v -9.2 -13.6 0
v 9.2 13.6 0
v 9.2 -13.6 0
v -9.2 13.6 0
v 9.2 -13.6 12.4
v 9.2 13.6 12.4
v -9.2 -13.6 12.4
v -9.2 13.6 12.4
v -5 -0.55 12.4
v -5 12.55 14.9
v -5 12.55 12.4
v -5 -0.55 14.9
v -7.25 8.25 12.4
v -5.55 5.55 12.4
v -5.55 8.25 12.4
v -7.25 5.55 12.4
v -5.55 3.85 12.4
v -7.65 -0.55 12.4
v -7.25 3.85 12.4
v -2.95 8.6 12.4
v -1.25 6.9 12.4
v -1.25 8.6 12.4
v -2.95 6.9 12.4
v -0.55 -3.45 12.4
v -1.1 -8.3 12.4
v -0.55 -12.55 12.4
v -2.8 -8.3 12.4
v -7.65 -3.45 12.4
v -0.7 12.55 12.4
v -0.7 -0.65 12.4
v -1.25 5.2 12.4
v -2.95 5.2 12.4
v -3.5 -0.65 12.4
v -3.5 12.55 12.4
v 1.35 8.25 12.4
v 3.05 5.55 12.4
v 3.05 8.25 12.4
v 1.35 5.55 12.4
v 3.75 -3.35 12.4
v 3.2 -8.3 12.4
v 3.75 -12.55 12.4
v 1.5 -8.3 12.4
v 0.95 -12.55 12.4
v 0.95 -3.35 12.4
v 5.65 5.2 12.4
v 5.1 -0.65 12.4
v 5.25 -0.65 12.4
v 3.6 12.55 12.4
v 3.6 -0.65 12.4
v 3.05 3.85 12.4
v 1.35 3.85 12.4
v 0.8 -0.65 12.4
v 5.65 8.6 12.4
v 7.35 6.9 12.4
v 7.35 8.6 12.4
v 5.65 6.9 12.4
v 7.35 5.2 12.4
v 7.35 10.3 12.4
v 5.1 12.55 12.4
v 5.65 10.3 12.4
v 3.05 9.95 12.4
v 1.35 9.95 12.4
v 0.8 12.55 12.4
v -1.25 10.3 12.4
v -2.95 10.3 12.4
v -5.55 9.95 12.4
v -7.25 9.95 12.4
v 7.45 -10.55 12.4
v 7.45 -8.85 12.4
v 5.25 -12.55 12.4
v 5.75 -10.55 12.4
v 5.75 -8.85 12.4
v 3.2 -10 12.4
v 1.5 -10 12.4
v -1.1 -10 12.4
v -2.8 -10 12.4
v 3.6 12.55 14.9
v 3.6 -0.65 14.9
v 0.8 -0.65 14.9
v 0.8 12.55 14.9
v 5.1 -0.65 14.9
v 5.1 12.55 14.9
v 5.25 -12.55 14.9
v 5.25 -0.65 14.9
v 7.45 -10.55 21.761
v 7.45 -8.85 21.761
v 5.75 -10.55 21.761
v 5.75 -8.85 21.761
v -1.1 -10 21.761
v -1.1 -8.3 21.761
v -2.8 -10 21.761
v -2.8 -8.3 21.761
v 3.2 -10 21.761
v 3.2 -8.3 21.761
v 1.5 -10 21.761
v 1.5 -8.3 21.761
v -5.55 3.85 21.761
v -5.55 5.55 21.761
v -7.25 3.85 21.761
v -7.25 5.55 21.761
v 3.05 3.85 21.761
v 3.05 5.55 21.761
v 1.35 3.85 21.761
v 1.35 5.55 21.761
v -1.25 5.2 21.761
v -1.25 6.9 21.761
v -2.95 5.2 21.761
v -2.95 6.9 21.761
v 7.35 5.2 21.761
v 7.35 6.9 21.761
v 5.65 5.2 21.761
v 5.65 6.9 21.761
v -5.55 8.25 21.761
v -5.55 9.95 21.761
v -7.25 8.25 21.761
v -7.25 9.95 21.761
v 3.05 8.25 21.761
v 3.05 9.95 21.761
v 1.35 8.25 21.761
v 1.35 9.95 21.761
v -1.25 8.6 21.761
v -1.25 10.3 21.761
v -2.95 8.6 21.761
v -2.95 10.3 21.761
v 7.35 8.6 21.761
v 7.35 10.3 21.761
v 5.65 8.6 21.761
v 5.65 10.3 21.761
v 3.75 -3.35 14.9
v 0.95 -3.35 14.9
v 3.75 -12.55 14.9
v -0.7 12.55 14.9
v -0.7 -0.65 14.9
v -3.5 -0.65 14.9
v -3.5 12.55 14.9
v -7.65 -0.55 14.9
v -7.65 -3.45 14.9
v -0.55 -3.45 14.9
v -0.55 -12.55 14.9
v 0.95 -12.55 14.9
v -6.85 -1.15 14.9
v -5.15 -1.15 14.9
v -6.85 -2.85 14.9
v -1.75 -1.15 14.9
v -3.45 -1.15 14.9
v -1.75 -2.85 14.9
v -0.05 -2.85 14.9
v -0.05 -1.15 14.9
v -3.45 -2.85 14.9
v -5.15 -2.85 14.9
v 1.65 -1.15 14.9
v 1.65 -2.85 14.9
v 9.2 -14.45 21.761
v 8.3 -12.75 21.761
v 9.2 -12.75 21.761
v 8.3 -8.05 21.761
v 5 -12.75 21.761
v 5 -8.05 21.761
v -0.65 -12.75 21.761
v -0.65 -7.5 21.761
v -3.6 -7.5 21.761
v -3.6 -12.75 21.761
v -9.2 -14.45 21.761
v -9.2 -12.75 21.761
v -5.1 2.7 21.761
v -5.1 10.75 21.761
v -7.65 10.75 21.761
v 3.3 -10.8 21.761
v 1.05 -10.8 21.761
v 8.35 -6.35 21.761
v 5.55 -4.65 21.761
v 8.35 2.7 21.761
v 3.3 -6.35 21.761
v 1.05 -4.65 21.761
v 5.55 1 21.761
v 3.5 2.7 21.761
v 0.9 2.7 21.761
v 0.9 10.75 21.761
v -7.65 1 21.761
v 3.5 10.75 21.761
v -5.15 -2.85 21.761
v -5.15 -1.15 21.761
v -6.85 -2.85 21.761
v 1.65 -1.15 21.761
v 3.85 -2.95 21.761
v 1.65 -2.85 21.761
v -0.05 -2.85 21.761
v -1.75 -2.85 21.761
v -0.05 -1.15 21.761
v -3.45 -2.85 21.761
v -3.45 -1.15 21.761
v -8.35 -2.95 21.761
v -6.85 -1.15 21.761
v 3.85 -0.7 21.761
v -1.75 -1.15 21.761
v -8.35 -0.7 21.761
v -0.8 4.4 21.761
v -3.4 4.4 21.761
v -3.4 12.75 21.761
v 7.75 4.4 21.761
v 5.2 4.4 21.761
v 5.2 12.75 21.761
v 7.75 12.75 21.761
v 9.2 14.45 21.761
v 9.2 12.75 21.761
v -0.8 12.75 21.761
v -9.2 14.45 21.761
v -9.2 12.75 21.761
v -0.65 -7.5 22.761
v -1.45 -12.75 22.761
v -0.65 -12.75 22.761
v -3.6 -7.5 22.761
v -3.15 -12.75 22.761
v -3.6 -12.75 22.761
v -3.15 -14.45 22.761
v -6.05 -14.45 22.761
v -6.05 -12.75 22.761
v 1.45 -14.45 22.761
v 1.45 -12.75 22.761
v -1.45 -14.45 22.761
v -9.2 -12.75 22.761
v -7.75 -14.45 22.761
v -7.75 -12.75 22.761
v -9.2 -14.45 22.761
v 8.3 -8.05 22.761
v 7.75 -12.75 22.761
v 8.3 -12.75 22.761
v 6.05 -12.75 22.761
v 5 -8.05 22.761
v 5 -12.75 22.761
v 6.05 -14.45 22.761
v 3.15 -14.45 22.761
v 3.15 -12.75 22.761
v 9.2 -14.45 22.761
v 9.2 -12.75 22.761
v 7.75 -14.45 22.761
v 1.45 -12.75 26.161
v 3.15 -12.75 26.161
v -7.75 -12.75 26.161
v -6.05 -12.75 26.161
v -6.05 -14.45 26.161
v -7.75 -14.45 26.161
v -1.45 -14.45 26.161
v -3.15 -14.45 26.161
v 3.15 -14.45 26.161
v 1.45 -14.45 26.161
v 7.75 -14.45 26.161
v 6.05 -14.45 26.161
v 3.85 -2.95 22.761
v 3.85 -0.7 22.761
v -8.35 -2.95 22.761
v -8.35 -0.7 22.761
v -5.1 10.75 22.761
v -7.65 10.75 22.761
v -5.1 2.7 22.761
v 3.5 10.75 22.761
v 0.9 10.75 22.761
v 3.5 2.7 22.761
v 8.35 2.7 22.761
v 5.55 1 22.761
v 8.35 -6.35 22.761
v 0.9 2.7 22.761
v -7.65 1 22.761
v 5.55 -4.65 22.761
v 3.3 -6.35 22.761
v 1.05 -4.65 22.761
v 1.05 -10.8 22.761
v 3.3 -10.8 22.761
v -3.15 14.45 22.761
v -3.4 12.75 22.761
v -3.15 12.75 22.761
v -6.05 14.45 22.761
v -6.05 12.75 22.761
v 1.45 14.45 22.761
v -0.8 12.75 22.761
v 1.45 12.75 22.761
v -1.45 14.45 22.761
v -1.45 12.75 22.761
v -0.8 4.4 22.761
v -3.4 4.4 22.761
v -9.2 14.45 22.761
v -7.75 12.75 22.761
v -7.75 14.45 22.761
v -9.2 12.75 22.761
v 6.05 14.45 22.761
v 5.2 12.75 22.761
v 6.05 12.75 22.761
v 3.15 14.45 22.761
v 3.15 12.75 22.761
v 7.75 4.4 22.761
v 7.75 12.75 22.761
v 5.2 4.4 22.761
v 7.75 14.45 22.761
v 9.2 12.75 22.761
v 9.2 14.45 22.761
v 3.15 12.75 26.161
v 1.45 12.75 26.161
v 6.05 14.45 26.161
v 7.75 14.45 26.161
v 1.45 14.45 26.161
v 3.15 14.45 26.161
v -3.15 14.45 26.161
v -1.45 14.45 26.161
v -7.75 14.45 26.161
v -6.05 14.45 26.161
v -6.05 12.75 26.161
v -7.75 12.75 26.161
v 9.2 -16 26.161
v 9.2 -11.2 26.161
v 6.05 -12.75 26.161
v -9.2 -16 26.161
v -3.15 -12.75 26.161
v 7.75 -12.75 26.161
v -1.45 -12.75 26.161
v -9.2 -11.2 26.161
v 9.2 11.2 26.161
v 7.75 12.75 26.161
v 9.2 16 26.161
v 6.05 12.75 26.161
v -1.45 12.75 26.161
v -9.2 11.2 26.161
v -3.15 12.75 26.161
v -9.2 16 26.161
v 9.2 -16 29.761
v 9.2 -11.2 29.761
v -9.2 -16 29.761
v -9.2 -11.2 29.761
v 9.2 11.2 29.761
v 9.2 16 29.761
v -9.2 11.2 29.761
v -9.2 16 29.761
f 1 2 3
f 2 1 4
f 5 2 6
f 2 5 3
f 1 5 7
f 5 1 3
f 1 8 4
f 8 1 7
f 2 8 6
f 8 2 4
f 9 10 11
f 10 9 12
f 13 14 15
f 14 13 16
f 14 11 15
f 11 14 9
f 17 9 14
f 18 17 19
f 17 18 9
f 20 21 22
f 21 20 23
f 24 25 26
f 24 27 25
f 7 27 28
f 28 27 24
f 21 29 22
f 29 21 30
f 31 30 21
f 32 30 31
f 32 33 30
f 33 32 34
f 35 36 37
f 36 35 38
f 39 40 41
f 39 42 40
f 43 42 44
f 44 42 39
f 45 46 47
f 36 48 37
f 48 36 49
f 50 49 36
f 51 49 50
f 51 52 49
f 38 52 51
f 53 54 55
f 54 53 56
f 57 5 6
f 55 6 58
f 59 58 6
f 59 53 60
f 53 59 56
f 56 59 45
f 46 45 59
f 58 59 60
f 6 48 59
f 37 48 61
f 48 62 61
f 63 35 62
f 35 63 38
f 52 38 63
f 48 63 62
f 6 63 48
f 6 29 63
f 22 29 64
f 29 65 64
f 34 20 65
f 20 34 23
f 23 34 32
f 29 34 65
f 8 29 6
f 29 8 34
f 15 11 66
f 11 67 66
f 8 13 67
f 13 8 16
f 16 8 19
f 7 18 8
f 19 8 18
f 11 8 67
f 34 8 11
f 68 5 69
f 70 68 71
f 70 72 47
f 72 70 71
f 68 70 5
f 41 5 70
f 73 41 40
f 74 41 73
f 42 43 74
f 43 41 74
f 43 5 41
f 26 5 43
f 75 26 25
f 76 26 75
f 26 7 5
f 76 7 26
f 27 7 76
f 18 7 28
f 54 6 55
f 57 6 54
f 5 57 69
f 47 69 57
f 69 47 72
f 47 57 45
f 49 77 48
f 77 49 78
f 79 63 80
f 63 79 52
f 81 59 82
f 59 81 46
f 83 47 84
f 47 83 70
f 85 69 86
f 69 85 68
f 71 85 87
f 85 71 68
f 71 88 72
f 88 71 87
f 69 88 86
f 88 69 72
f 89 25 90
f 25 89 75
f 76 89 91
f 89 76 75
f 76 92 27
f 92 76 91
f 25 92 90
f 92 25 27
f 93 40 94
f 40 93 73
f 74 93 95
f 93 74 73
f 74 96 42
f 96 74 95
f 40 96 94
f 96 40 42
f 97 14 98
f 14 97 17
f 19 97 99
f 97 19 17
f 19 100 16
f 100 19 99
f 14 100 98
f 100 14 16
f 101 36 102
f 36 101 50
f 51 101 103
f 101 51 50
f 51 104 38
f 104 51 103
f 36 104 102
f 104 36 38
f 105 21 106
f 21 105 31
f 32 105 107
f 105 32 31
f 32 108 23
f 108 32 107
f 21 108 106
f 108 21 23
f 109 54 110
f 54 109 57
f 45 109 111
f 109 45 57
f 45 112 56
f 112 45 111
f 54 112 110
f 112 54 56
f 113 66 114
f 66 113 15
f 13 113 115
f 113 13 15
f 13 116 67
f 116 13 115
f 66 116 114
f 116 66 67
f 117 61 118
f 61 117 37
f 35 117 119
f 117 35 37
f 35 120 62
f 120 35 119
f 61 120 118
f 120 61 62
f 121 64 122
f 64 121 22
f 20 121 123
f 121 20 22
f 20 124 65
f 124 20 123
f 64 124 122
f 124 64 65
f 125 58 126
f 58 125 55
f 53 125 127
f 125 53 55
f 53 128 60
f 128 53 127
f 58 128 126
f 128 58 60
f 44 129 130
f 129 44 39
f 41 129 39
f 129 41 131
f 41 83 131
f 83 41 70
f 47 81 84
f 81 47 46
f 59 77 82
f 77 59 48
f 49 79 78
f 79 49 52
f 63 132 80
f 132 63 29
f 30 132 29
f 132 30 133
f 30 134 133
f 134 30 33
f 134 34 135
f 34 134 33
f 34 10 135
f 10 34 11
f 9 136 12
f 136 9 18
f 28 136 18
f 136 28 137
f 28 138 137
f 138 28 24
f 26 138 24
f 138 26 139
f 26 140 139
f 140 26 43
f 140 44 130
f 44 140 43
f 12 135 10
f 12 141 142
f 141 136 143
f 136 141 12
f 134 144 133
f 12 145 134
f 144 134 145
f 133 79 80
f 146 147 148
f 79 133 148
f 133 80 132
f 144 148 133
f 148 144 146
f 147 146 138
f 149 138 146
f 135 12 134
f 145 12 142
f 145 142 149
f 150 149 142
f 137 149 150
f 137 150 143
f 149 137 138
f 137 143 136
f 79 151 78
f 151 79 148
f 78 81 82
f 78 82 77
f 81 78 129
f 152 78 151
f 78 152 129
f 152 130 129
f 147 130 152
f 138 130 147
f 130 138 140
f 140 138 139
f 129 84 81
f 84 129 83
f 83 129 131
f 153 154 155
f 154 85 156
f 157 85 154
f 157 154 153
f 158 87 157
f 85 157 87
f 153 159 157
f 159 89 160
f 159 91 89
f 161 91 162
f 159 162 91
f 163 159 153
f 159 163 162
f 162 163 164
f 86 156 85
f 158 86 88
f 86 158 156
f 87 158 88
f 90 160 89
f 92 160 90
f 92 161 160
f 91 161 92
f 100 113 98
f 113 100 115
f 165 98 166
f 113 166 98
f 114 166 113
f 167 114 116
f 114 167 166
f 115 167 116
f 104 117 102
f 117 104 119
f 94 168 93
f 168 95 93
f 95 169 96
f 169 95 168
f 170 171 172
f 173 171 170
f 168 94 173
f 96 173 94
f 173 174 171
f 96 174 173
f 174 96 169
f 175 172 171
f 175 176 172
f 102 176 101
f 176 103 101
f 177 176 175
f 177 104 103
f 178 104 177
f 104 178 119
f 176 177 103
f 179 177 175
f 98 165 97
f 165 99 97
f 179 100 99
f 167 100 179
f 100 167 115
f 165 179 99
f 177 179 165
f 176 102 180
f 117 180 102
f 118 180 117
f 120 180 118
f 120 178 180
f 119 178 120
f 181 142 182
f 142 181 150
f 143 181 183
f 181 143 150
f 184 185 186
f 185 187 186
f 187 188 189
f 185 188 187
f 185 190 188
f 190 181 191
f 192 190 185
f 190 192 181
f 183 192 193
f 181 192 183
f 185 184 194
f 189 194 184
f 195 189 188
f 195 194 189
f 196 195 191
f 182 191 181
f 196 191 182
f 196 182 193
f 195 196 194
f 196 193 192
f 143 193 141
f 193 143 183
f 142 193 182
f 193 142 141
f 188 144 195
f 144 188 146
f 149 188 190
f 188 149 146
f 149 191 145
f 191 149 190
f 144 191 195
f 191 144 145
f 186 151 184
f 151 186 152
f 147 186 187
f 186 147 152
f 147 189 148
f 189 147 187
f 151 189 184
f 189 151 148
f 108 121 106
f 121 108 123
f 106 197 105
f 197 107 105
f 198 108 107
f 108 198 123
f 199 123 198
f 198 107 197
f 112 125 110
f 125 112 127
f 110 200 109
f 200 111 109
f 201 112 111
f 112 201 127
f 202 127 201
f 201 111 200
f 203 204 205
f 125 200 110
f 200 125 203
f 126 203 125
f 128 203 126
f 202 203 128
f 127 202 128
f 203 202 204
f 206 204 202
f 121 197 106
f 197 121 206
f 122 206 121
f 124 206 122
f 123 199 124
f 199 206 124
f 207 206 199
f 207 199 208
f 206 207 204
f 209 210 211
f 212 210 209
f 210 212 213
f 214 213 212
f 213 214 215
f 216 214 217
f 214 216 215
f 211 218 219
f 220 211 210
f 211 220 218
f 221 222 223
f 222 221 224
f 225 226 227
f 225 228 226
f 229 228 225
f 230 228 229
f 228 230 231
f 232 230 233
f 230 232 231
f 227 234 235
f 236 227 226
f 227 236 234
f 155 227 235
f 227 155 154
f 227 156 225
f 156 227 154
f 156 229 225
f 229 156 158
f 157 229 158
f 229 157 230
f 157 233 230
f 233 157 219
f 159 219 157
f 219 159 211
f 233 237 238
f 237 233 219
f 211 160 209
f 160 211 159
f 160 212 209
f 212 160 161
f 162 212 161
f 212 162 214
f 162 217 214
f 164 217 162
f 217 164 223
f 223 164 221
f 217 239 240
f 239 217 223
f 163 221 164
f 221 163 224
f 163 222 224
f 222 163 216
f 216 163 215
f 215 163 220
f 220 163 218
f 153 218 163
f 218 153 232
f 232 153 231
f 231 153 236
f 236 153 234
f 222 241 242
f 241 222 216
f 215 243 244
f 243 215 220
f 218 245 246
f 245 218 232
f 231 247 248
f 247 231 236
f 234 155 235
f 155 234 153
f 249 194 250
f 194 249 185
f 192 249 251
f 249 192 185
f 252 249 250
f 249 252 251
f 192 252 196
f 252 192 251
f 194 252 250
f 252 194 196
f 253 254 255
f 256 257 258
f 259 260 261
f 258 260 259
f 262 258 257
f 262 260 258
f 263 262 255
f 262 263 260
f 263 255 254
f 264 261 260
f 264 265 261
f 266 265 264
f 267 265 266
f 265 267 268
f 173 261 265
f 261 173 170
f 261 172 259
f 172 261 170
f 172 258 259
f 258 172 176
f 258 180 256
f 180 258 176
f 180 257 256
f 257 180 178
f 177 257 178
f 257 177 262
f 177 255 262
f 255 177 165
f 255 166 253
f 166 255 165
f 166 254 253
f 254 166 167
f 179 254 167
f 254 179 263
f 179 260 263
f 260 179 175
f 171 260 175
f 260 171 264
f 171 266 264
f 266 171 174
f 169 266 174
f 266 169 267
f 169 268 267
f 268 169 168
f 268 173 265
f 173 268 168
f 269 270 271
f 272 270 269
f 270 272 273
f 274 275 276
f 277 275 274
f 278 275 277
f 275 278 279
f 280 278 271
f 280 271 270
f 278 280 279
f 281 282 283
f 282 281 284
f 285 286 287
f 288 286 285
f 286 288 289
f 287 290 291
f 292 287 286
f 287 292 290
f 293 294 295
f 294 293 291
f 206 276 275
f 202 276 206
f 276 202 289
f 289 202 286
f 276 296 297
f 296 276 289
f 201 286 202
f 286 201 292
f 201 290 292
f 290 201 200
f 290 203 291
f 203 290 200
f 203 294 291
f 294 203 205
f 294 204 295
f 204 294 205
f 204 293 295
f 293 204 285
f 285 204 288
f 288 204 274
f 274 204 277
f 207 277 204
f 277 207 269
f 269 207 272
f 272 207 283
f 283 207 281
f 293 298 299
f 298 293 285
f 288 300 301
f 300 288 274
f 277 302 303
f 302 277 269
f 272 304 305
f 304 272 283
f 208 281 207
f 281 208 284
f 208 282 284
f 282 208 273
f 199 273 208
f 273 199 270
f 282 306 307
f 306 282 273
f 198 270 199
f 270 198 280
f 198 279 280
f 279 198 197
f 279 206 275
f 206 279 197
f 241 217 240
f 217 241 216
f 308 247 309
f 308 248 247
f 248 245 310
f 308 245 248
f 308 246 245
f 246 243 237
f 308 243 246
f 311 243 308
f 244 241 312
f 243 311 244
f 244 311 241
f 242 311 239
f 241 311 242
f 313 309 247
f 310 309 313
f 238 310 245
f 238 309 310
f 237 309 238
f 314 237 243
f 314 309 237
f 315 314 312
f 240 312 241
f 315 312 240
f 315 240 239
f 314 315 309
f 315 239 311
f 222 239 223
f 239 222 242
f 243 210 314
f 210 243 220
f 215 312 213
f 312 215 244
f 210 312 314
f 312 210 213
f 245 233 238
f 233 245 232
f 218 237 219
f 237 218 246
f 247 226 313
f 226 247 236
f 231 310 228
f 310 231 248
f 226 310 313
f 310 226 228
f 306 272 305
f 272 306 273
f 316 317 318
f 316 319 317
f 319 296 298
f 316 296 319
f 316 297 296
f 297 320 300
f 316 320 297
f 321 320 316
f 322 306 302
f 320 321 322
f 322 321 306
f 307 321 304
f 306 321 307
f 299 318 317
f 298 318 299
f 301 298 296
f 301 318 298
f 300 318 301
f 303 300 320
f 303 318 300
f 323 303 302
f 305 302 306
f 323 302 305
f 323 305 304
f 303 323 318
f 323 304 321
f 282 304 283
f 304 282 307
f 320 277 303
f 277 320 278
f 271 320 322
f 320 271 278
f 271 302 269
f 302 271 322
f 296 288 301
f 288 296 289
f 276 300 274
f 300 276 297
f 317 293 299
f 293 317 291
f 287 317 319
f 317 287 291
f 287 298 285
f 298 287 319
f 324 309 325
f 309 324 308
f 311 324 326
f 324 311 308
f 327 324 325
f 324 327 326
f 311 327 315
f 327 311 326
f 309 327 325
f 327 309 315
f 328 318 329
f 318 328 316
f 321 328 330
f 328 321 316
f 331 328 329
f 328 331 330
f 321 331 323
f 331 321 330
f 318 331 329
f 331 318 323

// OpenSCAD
// Generated by SolidPython 0.4.2 on 2020-09-29 23:20:23
//!OpenSCAD

scale(v = 0.0100000000) {
	translate(v = [-920, -1360, 0]) {
		union() {
			color(c = [0.4000000000, 0.4000000000, 0.4000000000]) {
				translate(v = [0, 0, 0]) {
					linear_extrude(height = 1000.0000000000) {
						polygon(paths = [[0, 1, 2, 3]], points = [[0, 0], [0, 2720], [1840, 2720], [1840, 0]]);
					}
				}
			}
			color(c = [0.2000000000, 0.6000000000, 0.2000000000]) {
				translate(v = [0, 0, 1000.0000000000]) {
					linear_extrude(height = 120.0000000000) {
						polygon(paths = [[0, 1, 2, 3]], points = [[0, 1305], [0, 2720], [1840, 2720], [1840, 1305]]);
					}
				}
			}
			color(c = [0.4000000000, 0.4000000000, 0.4000000000]) {
				translate(v = [0, 0, 1000.0000000000]) {
					linear_extrude(height = 120.0000000000) {
						polygon(paths = [[0, 1, 2, 3]], points = [[0, 0], [0, 1305], [1840, 1305], [1840, 0]]);
					}
				}
			}
			color(c = [0.9000000000, 0.6000000000, 0.6000000000]) {
				translate(v = [0, 0, 1120.0000000000]) {
					linear_extrude(height = 120.0000000000) {
						polygon(paths = [[0, 1, 2, 3]], points = [[155, 1485], [155, 2485], [420, 2485], [420, 1485]]);
					}
				}
			}
			color(c = [0.9000000000, 0.6000000000, 0.6000000000]) {
				translate(v = [0, 0, 1120.0000000000]) {
					linear_extrude(height = 120.0000000000) {
						polygon(paths = [[0, 1, 2, 3]], points = [[570, 1485], [570, 2485], [850, 2485], [850, 1485]]);
					}
				}
			}
			color(c = [0.9000000000, 0.6000000000, 0.6000000000]) {
				translate(v = [0, 0, 1120.0000000000]) {
					linear_extrude(height = 120.0000000000) {
						polygon(paths = [[0, 1, 2, 3]], points = [[1000, 1485], [1000, 2485], [1280, 2485], [1280, 1485]]);
					}
				}
			}
			color(c = [0.9000000000, 0.6000000000, 0.6000000000]) {
				translate(v = [0, 0, 1120.0000000000]) {
					linear_extrude(height = 120.0000000000) {
						polygon(paths = [[0, 1, 2, 3]], points = [[1430, 1485], [1430, 2485], [1695, 2485], [1695, 1485]]);
					}
				}
			}
			color(c = [0.9000000000, 0.6000000000, 0.9000000000]) {
				translate(v = [0, 0, 1120.0000000000]) {
					linear_extrude(height = 120.0000000000) {
						polygon(paths = [[0, 1, 2, 3]], points = [[600, 235], [600, 655], [865, 655], [865, 235]]);
					}
				}
			}
			color(c = [0.9000000000, 0.6000000000, 0.9000000000]) {
				translate(v = [0, 0, 1120.0000000000]) {
					linear_extrude(height = 120.0000000000) {
						polygon(paths = [[0, 1, 2, 3]], points = [[1015, 235], [1015, 655], [1295, 655], [1295, 235]]);
					}
				}
			}
			color(c = [0.9000000000, 0.6000000000, 0.9000000000]) {
				translate(v = [0, 0, 1120.0000000000]) {
					linear_extrude(height = 120.0000000000) {
						polygon(paths = [[0, 1, 2, 3]], points = [[1445, 235], [1445, 655], [1705, 655], [1705, 235]]);
					}
				}
			}
			color(c = [0.2000000000, 0.6000000000, 0.2000000000]) {
				translate(v = [0, 0, 1120.0000000000]) {
					linear_extrude(height = 120.0000000000) {
						difference() {
							polygon(paths = [[0, 1, 2, 3]], points = [[0, 1305], [0, 2720], [1840, 2720], [1840, 1305]]);
							polygon(paths = [[0, 1, 2, 3]], points = [[155, 1485], [420, 1485], [420, 2485], [155, 2485]]);
							polygon(paths = [[0, 1, 2, 3]], points = [[570, 1485], [850, 1485], [850, 2485], [570, 2485]]);
							polygon(paths = [[0, 1, 2, 3]], points = [[1000, 1485], [1280, 1485], [1280, 2485], [1000, 2485]]);
							polygon(paths = [[0, 1, 2, 3]], points = [[1430, 1485], [1695, 1485], [1695, 2485], [1430, 2485]]);
						}
					}
				}
			}
			color(c = [0.4000000000, 0.4000000000, 0.4000000000]) {
				translate(v = [0, 0, 1120.0000000000]) {
					linear_extrude(height = 120.0000000000) {
						difference() {
							polygon(paths = [[0, 1, 2, 3]], points = [[0, 0], [0, 1305], [1840, 1305], [1840, 0]]);
							polygon(paths = [[0, 1, 2, 3]], points = [[600, 235], [865, 235], [865, 655], [600, 655]]);
							polygon(paths = [[0, 1, 2, 3]], points = [[1015, 235], [1295, 235], [1295, 655], [1015, 655]]);
							polygon(paths = [[0, 1, 2, 3]], points = [[1445, 235], [1705, 235], [1705, 655], [1445, 655]]);
						}
					}
				}
			}
			color(c = [0.1000000000, 0.1000000000, 0.1000000000]) {
				translate(v = [0, 0, 1240.0000000000]) {
					linear_extrude(height = 70.0000000000) {
						polygon(paths = [[0, 1, 2, 3]], points = [[1495, 305], [1495, 475], [1665, 475], [1665, 305]]);
					}
				}
			}
			color(c = [0.1000000000, 0.1000000000, 0.1000000000]) {
				translate(v = [0, 0, 1240.0000000000]) {
					linear_extrude(height = 70.0000000000) {
						polygon(paths = [[0, 1, 2, 3]], points = [[640, 360], [640, 530], [810, 530], [810, 360]]);
					}
				}
			}
			color(c = [0.1000000000, 0.1000000000, 0.1000000000]) {
				translate(v = [0, 0, 1240.0000000000]) {
					linear_extrude(height = 70.0000000000) {
						polygon(paths = [[0, 1, 2, 3]], points = [[1070, 360], [1070, 530], [1240, 530], [1240, 360]]);
					}
				}
			}
			color(c = [0.1000000000, 0.1000000000, 0.1000000000]) {
				translate(v = [0, 0, 1240.0000000000]) {
					linear_extrude(height = 70.0000000000) {
						polygon(paths = [[0, 1, 2, 3]], points = [[195, 1745], [195, 1915], [365, 1915], [365, 1745]]);
					}
				}
			}
			color(c = [0.1000000000, 0.1000000000, 0.1000000000]) {
				translate(v = [0, 0, 1240.0000000000]) {
					linear_extrude(height = 70.0000000000) {
						polygon(paths = [[0, 1, 2, 3]], points = [[1055, 1745], [1055, 1915], [1225, 1915], [1225, 1745]]);
					}
				}
			}
			color(c = [0.1000000000, 0.1000000000, 0.1000000000]) {
				translate(v = [0, 0, 1240.0000000000]) {
					linear_extrude(height = 70.0000000000) {
						polygon(paths = [[0, 1, 2, 3]], points = [[625, 1880], [625, 2050], [795, 2050], [795, 1880]]);
					}
				}
			}
			color(c = [0.1000000000, 0.1000000000, 0.1000000000]) {
				translate(v = [0, 0, 1240.0000000000]) {
					linear_extrude(height = 70.0000000000) {
						polygon(paths = [[0, 1, 2, 3]], points = [[1485, 1880], [1485, 2050], [1655, 2050], [1655, 1880]]);
					}
				}
			}
			color(c = [0.1000000000, 0.1000000000, 0.1000000000]) {
				translate(v = [0, 0, 1240.0000000000]) {
					linear_extrude(height = 70.0000000000) {
						polygon(paths = [[0, 1, 2, 3]], points = [[195, 2185], [195, 2355], [365, 2355], [365, 2185]]);
					}
				}
			}
			color(c = [0.1000000000, 0.1000000000, 0.1000000000]) {
				translate(v = [0, 0, 1240.0000000000]) {
					linear_extrude(height = 70.0000000000) {
						polygon(paths = [[0, 1, 2, 3]], points = [[1055, 2185], [1055, 2355], [1225, 2355], [1225, 2185]]);
					}
				}
			}
			color(c = [0.1000000000, 0.1000000000, 0.1000000000]) {
				translate(v = [0, 0, 1240.0000000000]) {
					linear_extrude(height = 70.0000000000) {
						polygon(paths = [[0, 1, 2, 3]], points = [[625, 2220], [625, 2390], [795, 2390], [795, 2220]]);
					}
				}
			}
			color(c = [0.1000000000, 0.1000000000, 0.1000000000]) {
				translate(v = [0, 0, 1240.0000000000]) {
					linear_extrude(height = 70.0000000000) {
						polygon(paths = [[0, 1, 2, 3]], points = [[1485, 2220], [1485, 2390], [1655, 2390], [1655, 2220]]);
					}
				}
			}
			color(c = [1.0000000000, 1.0000000000, 1.0000000000]) {
				translate(v = [0, 0, 1240.0000000000]) {
					linear_extrude(height = 70.0000000000) {
						polygon(paths = [[0, 1, 2, 3, 4, 5, 6, 7, 8, 9, 10, 11, 12, 13, 14, 15, 16, 17, 18, 19, 20, 21]], points = [[865, 105], [865, 1015], [155, 1015], [155, 1305], [420, 1305], [420, 2615], [570, 2615], [570, 1295], [850, 1295], [850, 2615], [1000, 2615], [1000, 1295], [1280, 1295], [1280, 2615], [1430, 2615], [1430, 1295], [1445, 1295], [1445, 105], [1295, 105], [1295, 1025], [1015, 1025], [1015, 105]]);
					}
				}
			}
			color(c = [0.1000000000, 0.1000000000, 0.1000000000]) {
				translate(v = [0, 0, 1310.0000000000]) {
					linear_extrude(height = 180.0000000000) {
						polygon(paths = [[0, 1, 2, 3]], points = [[1495, 305], [1495, 475], [1665, 475], [1665, 305]]);
					}
				}
			}
			color(c = [0.1000000000, 0.1000000000, 0.1000000000]) {
				translate(v = [0, 0, 1310.0000000000]) {
					linear_extrude(height = 180.0000000000) {
						polygon(paths = [[0, 1, 2, 3]], points = [[640, 360], [640, 530], [810, 530], [810, 360]]);
					}
				}
			}
			color(c = [0.1000000000, 0.1000000000, 0.1000000000]) {
				translate(v = [0, 0, 1310.0000000000]) {
					linear_extrude(height = 180.0000000000) {
						polygon(paths = [[0, 1, 2, 3]], points = [[1070, 360], [1070, 530], [1240, 530], [1240, 360]]);
					}
				}
			}
			color(c = [0.1000000000, 0.1000000000, 0.1000000000]) {
				translate(v = [0, 0, 1310.0000000000]) {
					linear_extrude(height = 180.0000000000) {
						polygon(paths = [[0, 1, 2, 3]], points = [[195, 1745], [195, 1915], [365, 1915], [365, 1745]]);
					}
				}
			}
			color(c = [0.1000000000, 0.1000000000, 0.1000000000]) {
				translate(v = [0, 0, 1310.0000000000]) {
					linear_extrude(height = 180.0000000000) {
						polygon(paths = [[0, 1, 2, 3]], points = [[1055, 1745], [1055, 1915], [1225, 1915], [1225, 1745]]);
					}
				}
			}
			color(c = [0.1000000000, 0.1000000000, 0.1000000000]) {
				translate(v = [0, 0, 1310.0000000000]) {
					linear_extrude(height = 180.0000000000) {
						polygon(paths = [[0, 1, 2, 3]], points = [[625, 1880], [625, 2050], [795, 2050], [795, 1880]]);
					}
				}
			}
			color(c = [0.1000000000, 0.1000000000, 0.1000000000]) {
				translate(v = [0, 0, 1310.0000000000]) {
					linear_extrude(height = 180.0000000000) {
						polygon(paths = [[0, 1, 2, 3]], points = [[1485, 1880], [1485, 2050], [1655, 2050], [1655, 1880]]);
					}
				}
			}
			color(c = [0.1000000000, 0.1000000000, 0.1000000000]) {
				translate(v = [0, 0, 1310.0000000000]) {
					linear_extrude(height = 180.0000000000) {
						polygon(paths = [[0, 1, 2, 3]], points = [[195, 2185], [195, 2355], [365, 2355], [365, 2185]]);
					}
				}
			}
			color(c = [0.1000000000, 0.1000000000, 0.1000000000]) {
				translate(v = [0, 0, 1310.0000000000]) {
					linear_extrude(height = 180.0000000000) {
						polygon(paths = [[0, 1, 2, 3]], points = [[1055, 2185], [1055, 2355], [1225, 2355], [1225, 2185]]);
					}
				}
			}
			color(c = [0.1000000000, 0.1000000000, 0.1000000000]) {
				translate(v = [0, 0, 1310.0000000000]) {
					linear_extrude(height = 180.0000000000) {
						polygon(paths = [[0, 1, 2, 3]], points = [[625, 2220], [625, 2390], [795, 2390], [795, 2220]]);
					}
				}
			}
			color(c = [0.1000000000, 0.1000000000, 0.1000000000]) {
				translate(v = [0, 0, 1310.0000000000]) {
					linear_extrude(height = 180.0000000000) {
						polygon(paths = [[0, 1, 2, 3]], points = [[1485, 2220], [1485, 2390], [1655, 2390], [1655, 2220]]);
					}
				}
			}
			color(c = [0.7000000000, 0, 0]) {
				translate(v = [0, 0, 1310.0000000000]) {
					linear_extrude(height = 180.0000000000) {
						polygon(paths = [[0, 1, 2, 3, 4, 5, 6, 7, 8, 9, 10, 11, 12, 13, 14, 15, 16, 17, 18, 19, 20, 21]], points = [[865, 105], [865, 1015], [155, 1015], [155, 1305], [420, 1305], [420, 2615], [570, 2615], [570, 1295], [850, 1295], [850, 2615], [1000, 2615], [1000, 1295], [1280, 1295], [1280, 2615], [1430, 2615], [1430, 1295], [1445, 1295], [1445, 105], [1295, 105], [1295, 1025], [1015, 1025], [1015, 105]]);
					}
				}
			}
			color(c = [0.1000000000, 0.1000000000, 0.1000000000]) {
				translate(v = [0, 0, 1490.0000000000]) {
					linear_extrude(height = 686.1000000000) {
						polygon(paths = [[0, 1, 2, 3]], points = [[1495, 305], [1495, 475], [1665, 475], [1665, 305]]);
					}
				}
			}
			color(c = [0.1000000000, 0.1000000000, 0.1000000000]) {
				translate(v = [0, 0, 1490.0000000000]) {
					linear_extrude(height = 686.1000000000) {
						polygon(paths = [[0, 1, 2, 3]], points = [[640, 360], [640, 530], [810, 530], [810, 360]]);
					}
				}
			}
			color(c = [0.1000000000, 0.1000000000, 0.1000000000]) {
				translate(v = [0, 0, 1490.0000000000]) {
					linear_extrude(height = 686.1000000000) {
						polygon(paths = [[0, 1, 2, 3]], points = [[1070, 360], [1070, 530], [1240, 530], [1240, 360]]);
					}
				}
			}
			color(c = [0.1000000000, 0.1000000000, 0.1000000000]) {
				translate(v = [0, 0, 1490.0000000000]) {
					linear_extrude(height = 686.1000000000) {
						polygon(paths = [[0, 1, 2, 3]], points = [[235, 1075], [235, 1245], [405, 1245], [405, 1075]]);
					}
				}
			}
			color(c = [0.1000000000, 0.1000000000, 0.1000000000]) {
				translate(v = [0, 0, 1490.0000000000]) {
					linear_extrude(height = 686.1000000000) {
						polygon(paths = [[0, 1, 2, 3]], points = [[575, 1075], [575, 1245], [745, 1245], [745, 1075]]);
					}
				}
			}
			color(c = [0.1000000000, 0.1000000000, 0.1000000000]) {
				translate(v = [0, 0, 1490.0000000000]) {
					linear_extrude(height = 686.1000000000) {
						polygon(paths = [[0, 1, 2, 3]], points = [[915, 1075], [915, 1245], [1085, 1245], [1085, 1075]]);
					}
				}
			}
			color(c = [0.1000000000, 0.1000000000, 0.1000000000]) {
				translate(v = [0, 0, 1490.0000000000]) {
					linear_extrude(height = 686.1000000000) {
						polygon(paths = [[0, 1, 2, 3]], points = [[195, 1745], [195, 1915], [365, 1915], [365, 1745]]);
					}
				}
			}
			color(c = [0.1000000000, 0.1000000000, 0.1000000000]) {
				translate(v = [0, 0, 1490.0000000000]) {
					linear_extrude(height = 686.1000000000) {
						polygon(paths = [[0, 1, 2, 3]], points = [[1055, 1745], [1055, 1915], [1225, 1915], [1225, 1745]]);
					}
				}
			}
			color(c = [0.1000000000, 0.1000000000, 0.1000000000]) {
				translate(v = [0, 0, 1490.0000000000]) {
					linear_extrude(height = 686.1000000000) {
						polygon(paths = [[0, 1, 2, 3]], points = [[625, 1880], [625, 2050], [795, 2050], [795, 1880]]);
					}
				}
			}
			color(c = [0.1000000000, 0.1000000000, 0.1000000000]) {
				translate(v = [0, 0, 1490.0000000000]) {
					linear_extrude(height = 686.1000000000) {
						polygon(paths = [[0, 1, 2, 3]], points = [[1485, 1880], [1485, 2050], [1655, 2050], [1655, 1880]]);
					}
				}
			}
			color(c = [0.1000000000, 0.1000000000, 0.1000000000]) {
				translate(v = [0, 0, 1490.0000000000]) {
					linear_extrude(height = 686.1000000000) {
						polygon(paths = [[0, 1, 2, 3]], points = [[195, 2185], [195, 2355], [365, 2355], [365, 2185]]);
					}
				}
			}
			color(c = [0.1000000000, 0.1000000000, 0.1000000000]) {
				translate(v = [0, 0, 1490.0000000000]) {
					linear_extrude(height = 686.1000000000) {
						polygon(paths = [[0, 1, 2, 3]], points = [[1055, 2185], [1055, 2355], [1225, 2355], [1225, 2185]]);
					}
				}
			}
			color(c = [0.1000000000, 0.1000000000, 0.1000000000]) {
				translate(v = [0, 0, 1490.0000000000]) {
					linear_extrude(height = 686.1000000000) {
						polygon(paths = [[0, 1, 2, 3]], points = [[625, 2220], [625, 2390], [795, 2390], [795, 2220]]);
					}
				}
			}
			color(c = [0.1000000000, 0.1000000000, 0.1000000000]) {
				translate(v = [0, 0, 1490.0000000000]) {
					linear_extrude(height = 686.1000000000) {
						polygon(paths = [[0, 1, 2, 3]], points = [[1485, 2220], [1485, 2390], [1655, 2390], [1655, 2220]]);
					}
				}
			}
			color(c = [0.9000000000, 0.6000000000, 0.6000000000]) {
				translate(v = [0, 0, 2176.1000000000]) {
					linear_extrude(height = 100.0000000000) {
						polygon(paths = [[0, 1, 2, 3, 4, 5, 6, 7, 8, 9, 10, 11]], points = [[0, -85], [0, 85], [560, 85], [560, 610], [855, 610], [855, 85], [1420, 85], [1420, 555], [1750, 555], [1750, 85], [1840, 85], [1840, -85]]);
					}
				}
			}
			color(c = [0.9000000000, 0.6000000000, 0.6000000000]) {
				translate(v = [0, 0, 2176.1000000000]) {
					linear_extrude(height = 100.0000000000) {
						polygon(paths = [[0, 1, 2, 3]], points = [[85, 1065], [85, 1290], [1305, 1290], [1305, 1065]]);
					}
				}
			}
			color(c = [0.9000000000, 0.6000000000, 0.6000000000]) {
				translate(v = [0, 0, 2176.1000000000]) {
					linear_extrude(height = 100.0000000000) {
						polygon(paths = [[0, 1, 2, 3, 4, 5, 6, 7, 8, 9, 10, 11, 12, 13, 14, 15]], points = [[1025, 280], [1025, 895], [1475, 895], [1475, 1460], [155, 1460], [155, 2435], [410, 2435], [410, 1630], [1010, 1630], [1010, 2435], [1270, 2435], [1270, 1630], [1755, 1630], [1755, 725], [1250, 725], [1250, 280]]);
					}
				}
			}
			color(c = [0.9000000000, 0.6000000000, 0.6000000000]) {
				translate(v = [0, 0, 2176.1000000000]) {
					linear_extrude(height = 100.0000000000) {
						polygon(paths = [[0, 1, 2, 3, 4, 5, 6, 7, 8, 9, 10, 11]], points = [[580, 1800], [580, 2635], [0, 2635], [0, 2805], [1840, 2805], [1840, 2635], [1695, 2635], [1695, 1800], [1440, 1800], [1440, 2635], [840, 2635], [840, 1800]]);
					}
				}
			}
			color(c = [0.5000000000, 0.5000000000, 0.5000000000]) {
				translate(v = [0, 0, 2276.1000000000]) {
					linear_extrude(height = 340.0000000000) {
						polygon(paths = [[0, 1, 2, 3]], points = [[145, -85], [145, 85], [315, 85], [315, -85]]);
					}
				}
			}
			color(c = [0.5000000000, 0.5000000000, 0.5000000000]) {
				translate(v = [0, 0, 2276.1000000000]) {
					linear_extrude(height = 340.0000000000) {
						polygon(paths = [[0, 1, 2, 3]], points = [[605, -85], [605, 85], [775, 85], [775, -85]]);
					}
				}
			}
			color(c = [0.5000000000, 0.5000000000, 0.5000000000]) {
				translate(v = [0, 0, 2276.1000000000]) {
					linear_extrude(height = 340.0000000000) {
						polygon(paths = [[0, 1, 2, 3]], points = [[1065, -85], [1065, 85], [1235, 85], [1235, -85]]);
					}
				}
			}
			color(c = [0.5000000000, 0.5000000000, 0.5000000000]) {
				translate(v = [0, 0, 2276.1000000000]) {
					linear_extrude(height = 340.0000000000) {
						polygon(paths = [[0, 1, 2, 3]], points = [[1525, -85], [1525, 85], [1695, 85], [1695, -85]]);
					}
				}
			}
			color(c = [0.5000000000, 0.5000000000, 0.5000000000]) {
				translate(v = [0, 0, 2276.1000000000]) {
					linear_extrude(height = 340.0000000000) {
						polygon(paths = [[0, 1, 2, 3]], points = [[145, 2635], [145, 2805], [315, 2805], [315, 2635]]);
					}
				}
			}
			color(c = [0.5000000000, 0.5000000000, 0.5000000000]) {
				translate(v = [0, 0, 2276.1000000000]) {
					linear_extrude(height = 340.0000000000) {
						polygon(paths = [[0, 1, 2, 3]], points = [[605, 2635], [605, 2805], [775, 2805], [775, 2635]]);
					}
				}
			}
			color(c = [0.5000000000, 0.5000000000, 0.5000000000]) {
				translate(v = [0, 0, 2276.1000000000]) {
					linear_extrude(height = 340.0000000000) {
						polygon(paths = [[0, 1, 2, 3]], points = [[1065, 2635], [1065, 2805], [1235, 2805], [1235, 2635]]);
					}
				}
			}
			color(c = [0.5000000000, 0.5000000000, 0.5000000000]) {
				translate(v = [0, 0, 2276.1000000000]) {
					linear_extrude(height = 340.0000000000) {
						polygon(paths = [[0, 1, 2, 3]], points = [[1525, 2635], [1525, 2805], [1695, 2805], [1695, 2635]]);
					}
				}
			}
			color(c = [0.3000000000, 0.3000000000, 1]) {
				translate(v = [0, 0, 2616.1000000000]) {
					linear_extrude(height = 360.0000000000) {
						polygon(paths = [[0, 1, 2, 3]], points = [[0, -240], [0, 240], [1840, 240], [1840, -240]]);
					}
				}
			}
			color(c = [0.3000000000, 0.3000000000, 1]) {
				translate(v = [0, 0, 2616.1000000000]) {
					linear_extrude(height = 360.0000000000) {
						polygon(paths = [[0, 1, 2, 3]], points = [[0, 2480], [0, 2960], [1840, 2960], [1840, 2480]]);
					}
				}
			}
		}
	}
}
